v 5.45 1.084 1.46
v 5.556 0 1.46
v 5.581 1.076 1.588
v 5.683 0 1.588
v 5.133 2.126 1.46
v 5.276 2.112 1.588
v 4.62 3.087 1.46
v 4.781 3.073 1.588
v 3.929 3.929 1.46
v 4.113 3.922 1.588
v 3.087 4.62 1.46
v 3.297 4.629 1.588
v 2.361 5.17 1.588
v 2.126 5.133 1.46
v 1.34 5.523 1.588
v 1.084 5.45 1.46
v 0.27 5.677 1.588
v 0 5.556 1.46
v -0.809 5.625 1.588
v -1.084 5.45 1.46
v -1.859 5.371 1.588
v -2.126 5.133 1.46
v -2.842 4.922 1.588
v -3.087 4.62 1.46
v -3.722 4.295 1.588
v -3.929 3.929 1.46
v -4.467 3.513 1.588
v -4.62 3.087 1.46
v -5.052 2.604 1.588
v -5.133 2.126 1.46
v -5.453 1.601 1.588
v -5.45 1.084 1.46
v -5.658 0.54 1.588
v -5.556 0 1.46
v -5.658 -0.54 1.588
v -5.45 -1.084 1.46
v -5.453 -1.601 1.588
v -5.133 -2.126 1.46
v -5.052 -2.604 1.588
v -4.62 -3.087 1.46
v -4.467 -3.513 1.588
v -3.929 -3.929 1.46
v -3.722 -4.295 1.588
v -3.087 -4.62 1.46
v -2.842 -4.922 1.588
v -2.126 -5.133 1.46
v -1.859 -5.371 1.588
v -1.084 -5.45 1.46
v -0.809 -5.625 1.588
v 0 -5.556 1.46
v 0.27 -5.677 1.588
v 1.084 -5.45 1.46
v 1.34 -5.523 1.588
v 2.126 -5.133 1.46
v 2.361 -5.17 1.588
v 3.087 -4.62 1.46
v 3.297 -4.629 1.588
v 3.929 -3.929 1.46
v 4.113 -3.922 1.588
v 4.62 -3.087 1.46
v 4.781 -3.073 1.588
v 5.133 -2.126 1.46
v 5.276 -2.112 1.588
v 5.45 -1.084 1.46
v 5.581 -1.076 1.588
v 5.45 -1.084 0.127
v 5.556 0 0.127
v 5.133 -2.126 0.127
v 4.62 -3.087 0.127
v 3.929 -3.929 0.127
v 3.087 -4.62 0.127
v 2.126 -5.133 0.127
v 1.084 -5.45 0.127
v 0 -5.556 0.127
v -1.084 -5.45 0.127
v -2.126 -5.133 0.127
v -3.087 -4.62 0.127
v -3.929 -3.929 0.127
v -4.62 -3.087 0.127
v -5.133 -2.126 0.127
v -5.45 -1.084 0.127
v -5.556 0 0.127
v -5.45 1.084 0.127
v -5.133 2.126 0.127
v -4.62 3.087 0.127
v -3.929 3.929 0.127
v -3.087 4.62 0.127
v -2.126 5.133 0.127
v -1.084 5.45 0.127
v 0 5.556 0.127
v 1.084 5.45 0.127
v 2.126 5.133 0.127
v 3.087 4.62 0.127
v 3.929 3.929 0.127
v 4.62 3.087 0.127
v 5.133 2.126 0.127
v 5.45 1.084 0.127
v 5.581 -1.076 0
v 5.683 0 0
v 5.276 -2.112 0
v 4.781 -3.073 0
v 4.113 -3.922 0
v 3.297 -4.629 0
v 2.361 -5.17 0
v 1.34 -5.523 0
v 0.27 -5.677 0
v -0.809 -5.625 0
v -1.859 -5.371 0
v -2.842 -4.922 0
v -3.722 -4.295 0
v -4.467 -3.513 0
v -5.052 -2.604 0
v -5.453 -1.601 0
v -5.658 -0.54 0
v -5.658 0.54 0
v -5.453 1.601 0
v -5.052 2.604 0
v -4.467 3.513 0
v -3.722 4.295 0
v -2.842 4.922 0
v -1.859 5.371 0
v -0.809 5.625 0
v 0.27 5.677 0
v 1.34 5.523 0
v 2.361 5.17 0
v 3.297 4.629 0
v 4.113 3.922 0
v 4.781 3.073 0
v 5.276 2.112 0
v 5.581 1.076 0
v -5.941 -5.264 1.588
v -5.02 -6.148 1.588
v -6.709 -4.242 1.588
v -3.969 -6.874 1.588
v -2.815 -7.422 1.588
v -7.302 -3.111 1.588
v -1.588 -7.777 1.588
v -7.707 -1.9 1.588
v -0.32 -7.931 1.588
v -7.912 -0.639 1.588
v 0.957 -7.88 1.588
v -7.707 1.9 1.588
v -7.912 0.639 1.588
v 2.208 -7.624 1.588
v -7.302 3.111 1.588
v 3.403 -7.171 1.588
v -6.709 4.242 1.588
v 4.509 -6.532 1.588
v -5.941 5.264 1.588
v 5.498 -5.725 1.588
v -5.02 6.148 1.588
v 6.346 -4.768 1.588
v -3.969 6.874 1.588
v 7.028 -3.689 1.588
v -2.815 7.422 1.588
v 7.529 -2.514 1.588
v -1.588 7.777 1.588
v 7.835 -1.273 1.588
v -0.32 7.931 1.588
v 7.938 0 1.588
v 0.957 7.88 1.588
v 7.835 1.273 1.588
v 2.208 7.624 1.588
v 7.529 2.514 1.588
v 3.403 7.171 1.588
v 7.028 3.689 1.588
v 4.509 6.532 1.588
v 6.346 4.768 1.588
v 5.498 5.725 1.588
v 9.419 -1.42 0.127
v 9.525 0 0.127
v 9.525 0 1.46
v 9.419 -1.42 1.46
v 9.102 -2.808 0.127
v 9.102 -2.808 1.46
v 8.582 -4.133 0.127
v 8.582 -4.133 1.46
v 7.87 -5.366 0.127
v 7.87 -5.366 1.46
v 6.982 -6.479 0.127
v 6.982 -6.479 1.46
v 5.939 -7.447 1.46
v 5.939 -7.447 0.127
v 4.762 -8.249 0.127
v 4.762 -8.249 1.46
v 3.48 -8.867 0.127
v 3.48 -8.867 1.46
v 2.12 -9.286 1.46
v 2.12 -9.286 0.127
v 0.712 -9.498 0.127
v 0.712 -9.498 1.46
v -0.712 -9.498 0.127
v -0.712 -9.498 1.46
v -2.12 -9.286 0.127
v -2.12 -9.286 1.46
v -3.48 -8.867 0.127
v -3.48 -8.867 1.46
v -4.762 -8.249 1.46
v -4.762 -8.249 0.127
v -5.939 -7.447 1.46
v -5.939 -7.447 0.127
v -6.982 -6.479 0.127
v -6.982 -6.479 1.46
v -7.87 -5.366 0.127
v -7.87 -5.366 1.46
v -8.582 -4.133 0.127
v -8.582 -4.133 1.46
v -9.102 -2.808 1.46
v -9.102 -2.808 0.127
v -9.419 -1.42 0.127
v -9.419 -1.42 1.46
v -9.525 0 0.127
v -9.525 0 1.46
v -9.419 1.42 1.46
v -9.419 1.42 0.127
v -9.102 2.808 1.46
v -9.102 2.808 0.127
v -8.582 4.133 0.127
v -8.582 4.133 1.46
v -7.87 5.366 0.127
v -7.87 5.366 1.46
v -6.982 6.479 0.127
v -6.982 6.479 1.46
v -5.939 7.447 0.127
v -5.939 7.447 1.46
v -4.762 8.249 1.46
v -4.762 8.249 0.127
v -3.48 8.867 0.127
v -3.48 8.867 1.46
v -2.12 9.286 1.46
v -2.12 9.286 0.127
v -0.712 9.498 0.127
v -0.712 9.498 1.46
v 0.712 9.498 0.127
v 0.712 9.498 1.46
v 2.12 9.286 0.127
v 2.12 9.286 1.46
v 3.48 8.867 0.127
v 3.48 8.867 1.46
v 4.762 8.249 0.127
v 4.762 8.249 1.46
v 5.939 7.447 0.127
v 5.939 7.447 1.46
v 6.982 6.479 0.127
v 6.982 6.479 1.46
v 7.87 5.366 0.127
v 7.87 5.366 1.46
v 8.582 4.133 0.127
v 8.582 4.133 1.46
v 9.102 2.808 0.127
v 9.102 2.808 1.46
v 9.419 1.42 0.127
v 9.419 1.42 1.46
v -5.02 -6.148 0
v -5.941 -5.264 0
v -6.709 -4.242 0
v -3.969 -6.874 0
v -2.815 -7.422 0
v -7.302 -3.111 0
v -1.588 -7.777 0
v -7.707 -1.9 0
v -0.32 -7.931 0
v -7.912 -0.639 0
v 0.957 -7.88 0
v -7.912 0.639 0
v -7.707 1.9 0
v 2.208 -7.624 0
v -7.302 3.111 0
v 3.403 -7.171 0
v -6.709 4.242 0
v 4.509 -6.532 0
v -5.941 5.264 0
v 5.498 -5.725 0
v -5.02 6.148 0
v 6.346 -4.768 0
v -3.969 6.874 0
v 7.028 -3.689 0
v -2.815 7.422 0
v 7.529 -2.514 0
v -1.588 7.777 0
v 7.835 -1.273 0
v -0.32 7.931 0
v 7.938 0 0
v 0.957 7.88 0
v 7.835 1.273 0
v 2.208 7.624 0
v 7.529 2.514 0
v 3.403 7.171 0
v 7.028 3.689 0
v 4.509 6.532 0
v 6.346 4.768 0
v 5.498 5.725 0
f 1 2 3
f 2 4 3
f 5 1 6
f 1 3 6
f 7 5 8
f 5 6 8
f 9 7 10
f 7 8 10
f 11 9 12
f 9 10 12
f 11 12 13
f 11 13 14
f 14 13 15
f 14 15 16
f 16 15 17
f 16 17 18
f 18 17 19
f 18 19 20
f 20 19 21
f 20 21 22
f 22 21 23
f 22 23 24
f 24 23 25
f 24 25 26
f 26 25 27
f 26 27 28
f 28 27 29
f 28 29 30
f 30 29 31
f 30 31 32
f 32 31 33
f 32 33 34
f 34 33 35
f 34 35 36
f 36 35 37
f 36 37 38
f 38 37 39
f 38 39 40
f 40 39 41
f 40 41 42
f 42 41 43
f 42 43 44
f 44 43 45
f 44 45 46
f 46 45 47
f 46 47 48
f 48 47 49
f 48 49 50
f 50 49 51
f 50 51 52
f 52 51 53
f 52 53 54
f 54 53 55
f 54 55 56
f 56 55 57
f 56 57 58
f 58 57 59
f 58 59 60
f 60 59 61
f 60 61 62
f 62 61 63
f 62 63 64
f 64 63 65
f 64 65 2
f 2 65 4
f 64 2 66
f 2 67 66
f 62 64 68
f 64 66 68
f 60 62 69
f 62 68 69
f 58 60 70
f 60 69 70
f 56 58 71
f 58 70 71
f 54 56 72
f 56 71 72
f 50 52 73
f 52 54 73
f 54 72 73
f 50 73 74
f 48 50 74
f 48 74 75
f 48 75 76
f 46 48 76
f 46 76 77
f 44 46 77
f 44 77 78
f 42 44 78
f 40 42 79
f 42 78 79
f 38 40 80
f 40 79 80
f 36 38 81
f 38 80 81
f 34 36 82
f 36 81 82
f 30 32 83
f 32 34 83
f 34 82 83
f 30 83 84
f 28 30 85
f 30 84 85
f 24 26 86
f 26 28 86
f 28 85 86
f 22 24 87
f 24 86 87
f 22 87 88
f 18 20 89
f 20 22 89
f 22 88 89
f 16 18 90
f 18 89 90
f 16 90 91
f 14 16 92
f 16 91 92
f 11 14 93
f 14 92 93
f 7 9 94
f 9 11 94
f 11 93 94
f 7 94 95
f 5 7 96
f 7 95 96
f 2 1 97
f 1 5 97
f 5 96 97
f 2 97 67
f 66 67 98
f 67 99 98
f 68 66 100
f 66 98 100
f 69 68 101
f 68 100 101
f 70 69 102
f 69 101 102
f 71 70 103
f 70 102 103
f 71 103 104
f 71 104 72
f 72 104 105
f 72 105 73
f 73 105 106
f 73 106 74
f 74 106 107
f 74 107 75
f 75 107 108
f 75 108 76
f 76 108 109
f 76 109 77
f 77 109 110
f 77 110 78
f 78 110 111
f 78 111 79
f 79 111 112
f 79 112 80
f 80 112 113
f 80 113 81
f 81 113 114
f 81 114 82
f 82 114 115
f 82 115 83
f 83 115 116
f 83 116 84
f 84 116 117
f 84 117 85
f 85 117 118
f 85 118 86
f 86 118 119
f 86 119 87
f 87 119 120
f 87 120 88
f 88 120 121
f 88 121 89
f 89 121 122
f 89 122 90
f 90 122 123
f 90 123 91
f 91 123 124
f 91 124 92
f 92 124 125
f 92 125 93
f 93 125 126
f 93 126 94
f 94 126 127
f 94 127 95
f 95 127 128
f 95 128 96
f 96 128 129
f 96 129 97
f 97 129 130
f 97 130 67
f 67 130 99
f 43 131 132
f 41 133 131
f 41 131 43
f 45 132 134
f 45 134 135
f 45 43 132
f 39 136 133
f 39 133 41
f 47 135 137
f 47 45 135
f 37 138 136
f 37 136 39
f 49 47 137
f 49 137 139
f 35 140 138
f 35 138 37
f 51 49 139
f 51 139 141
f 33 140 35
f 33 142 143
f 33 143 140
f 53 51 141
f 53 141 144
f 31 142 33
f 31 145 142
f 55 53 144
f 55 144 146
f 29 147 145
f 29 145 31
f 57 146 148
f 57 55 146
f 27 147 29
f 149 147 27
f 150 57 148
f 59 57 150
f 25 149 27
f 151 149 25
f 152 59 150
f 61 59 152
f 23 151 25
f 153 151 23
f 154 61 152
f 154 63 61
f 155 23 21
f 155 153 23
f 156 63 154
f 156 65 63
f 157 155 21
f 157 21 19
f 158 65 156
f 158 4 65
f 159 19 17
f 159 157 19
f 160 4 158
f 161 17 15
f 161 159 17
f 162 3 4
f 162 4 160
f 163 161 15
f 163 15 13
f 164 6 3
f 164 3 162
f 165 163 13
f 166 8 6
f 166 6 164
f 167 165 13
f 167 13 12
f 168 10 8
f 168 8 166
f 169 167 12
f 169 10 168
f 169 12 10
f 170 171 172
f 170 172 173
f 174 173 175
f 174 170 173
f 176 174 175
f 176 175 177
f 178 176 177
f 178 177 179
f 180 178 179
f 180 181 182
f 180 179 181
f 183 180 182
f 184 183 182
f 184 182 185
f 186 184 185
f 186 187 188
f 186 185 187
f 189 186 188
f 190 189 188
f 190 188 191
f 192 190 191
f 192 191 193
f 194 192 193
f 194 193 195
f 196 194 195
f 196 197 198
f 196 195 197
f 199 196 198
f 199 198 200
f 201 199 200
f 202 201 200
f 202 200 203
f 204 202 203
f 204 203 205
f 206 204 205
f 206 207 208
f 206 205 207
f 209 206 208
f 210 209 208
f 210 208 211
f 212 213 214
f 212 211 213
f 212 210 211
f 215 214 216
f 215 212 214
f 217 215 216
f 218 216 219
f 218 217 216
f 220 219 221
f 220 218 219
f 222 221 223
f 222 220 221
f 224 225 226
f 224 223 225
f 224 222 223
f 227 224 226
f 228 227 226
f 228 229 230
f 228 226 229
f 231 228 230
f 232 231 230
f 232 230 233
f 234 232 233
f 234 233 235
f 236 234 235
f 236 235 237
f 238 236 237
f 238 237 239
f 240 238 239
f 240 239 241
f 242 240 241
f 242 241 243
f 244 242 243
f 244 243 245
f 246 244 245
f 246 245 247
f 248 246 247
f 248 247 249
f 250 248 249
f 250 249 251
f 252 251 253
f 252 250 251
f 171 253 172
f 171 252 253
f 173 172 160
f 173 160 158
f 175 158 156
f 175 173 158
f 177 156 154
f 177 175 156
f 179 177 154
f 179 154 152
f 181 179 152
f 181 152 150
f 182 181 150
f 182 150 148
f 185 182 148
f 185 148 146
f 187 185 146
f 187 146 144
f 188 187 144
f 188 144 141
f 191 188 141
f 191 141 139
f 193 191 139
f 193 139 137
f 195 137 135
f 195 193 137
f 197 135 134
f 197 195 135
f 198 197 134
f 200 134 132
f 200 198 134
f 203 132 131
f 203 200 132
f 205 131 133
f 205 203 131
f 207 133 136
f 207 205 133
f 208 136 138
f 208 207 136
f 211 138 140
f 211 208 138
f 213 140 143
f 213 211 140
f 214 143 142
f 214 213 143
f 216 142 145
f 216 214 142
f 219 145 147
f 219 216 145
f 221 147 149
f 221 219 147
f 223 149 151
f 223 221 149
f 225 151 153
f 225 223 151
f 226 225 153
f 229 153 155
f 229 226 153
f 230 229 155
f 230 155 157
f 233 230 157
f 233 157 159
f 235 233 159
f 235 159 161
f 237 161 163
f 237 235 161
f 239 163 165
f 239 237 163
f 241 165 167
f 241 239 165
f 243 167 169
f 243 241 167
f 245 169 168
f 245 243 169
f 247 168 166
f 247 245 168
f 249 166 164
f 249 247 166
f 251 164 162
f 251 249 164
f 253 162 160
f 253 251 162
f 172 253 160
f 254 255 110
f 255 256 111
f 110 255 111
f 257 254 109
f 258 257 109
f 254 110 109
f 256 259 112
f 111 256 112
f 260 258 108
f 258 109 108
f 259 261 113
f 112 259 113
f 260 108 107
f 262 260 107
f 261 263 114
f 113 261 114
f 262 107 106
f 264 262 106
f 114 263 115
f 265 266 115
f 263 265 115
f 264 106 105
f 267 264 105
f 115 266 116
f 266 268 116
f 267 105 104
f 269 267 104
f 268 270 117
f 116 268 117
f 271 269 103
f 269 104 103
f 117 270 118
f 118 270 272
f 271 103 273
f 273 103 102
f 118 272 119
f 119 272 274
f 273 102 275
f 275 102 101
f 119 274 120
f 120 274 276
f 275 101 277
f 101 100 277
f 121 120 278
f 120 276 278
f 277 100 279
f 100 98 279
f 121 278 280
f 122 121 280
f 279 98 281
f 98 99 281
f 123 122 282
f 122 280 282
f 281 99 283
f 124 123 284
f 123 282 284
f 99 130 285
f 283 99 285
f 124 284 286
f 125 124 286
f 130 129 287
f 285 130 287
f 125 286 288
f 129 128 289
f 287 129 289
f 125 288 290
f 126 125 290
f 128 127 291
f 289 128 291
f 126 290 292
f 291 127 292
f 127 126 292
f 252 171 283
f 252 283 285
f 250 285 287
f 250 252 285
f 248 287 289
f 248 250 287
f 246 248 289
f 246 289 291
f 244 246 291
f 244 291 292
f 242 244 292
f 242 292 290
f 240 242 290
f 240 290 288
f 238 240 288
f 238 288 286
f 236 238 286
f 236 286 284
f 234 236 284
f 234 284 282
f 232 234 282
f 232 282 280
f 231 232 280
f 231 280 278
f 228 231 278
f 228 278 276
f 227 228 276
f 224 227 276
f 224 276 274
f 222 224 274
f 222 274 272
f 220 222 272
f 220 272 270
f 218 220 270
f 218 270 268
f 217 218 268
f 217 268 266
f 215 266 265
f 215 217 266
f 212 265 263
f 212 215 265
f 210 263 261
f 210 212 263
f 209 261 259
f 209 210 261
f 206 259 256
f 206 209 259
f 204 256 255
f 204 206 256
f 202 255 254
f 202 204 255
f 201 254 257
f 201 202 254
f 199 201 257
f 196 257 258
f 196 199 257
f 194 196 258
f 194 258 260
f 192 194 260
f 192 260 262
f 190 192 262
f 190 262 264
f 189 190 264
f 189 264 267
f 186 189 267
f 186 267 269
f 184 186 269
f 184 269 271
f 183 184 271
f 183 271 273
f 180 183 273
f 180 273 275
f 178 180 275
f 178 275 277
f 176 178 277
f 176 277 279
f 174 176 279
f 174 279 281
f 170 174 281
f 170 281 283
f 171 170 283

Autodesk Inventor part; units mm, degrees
ref_plane "YZ Plane" through (0, 0, 0) normal (1, 0, 0) x (0, 1, 0)
ref_plane "XZ Plane" through (0, 0, 0) normal (0, 1, 0) x (-1, 0, 0)
ref_plane "XY Plane" through (0, 0, 0) normal (0, 0, 1) x (1, 0, 0)
sketch "Sketch1" plane through (0, 0, 0) normal (0, 0, 1) x (1, 0, 0)
  circle A0 centre (0, 0) radius 5.5563
  circle A1 centre (0, 0) radius 9.525
  dimension "d0" = 11.1125
extrude "Extrusion1" add sketch "Sketch1" along normal blind 1.5875
chamfer "Chamfer1" distance 0.127 distance2 1.5875 1 edges at (-9.525, 0, 1.5875) measured on face at (9.4941, -0.7664, 1.0583)
chamfer "Chamfer2" distance 1.5875 distance2 0.127 1 edges at (-9.525, 0, 0) measured on face at (8.1098, -0.7598, 0)
chamfer "Chamfer3" distance 0.127 angle 45 2 edges at (-5.5563, 0, 0) (-5.5563, 0, 1.5875)
properties part number "trim washer" material "Stainless Steel"
